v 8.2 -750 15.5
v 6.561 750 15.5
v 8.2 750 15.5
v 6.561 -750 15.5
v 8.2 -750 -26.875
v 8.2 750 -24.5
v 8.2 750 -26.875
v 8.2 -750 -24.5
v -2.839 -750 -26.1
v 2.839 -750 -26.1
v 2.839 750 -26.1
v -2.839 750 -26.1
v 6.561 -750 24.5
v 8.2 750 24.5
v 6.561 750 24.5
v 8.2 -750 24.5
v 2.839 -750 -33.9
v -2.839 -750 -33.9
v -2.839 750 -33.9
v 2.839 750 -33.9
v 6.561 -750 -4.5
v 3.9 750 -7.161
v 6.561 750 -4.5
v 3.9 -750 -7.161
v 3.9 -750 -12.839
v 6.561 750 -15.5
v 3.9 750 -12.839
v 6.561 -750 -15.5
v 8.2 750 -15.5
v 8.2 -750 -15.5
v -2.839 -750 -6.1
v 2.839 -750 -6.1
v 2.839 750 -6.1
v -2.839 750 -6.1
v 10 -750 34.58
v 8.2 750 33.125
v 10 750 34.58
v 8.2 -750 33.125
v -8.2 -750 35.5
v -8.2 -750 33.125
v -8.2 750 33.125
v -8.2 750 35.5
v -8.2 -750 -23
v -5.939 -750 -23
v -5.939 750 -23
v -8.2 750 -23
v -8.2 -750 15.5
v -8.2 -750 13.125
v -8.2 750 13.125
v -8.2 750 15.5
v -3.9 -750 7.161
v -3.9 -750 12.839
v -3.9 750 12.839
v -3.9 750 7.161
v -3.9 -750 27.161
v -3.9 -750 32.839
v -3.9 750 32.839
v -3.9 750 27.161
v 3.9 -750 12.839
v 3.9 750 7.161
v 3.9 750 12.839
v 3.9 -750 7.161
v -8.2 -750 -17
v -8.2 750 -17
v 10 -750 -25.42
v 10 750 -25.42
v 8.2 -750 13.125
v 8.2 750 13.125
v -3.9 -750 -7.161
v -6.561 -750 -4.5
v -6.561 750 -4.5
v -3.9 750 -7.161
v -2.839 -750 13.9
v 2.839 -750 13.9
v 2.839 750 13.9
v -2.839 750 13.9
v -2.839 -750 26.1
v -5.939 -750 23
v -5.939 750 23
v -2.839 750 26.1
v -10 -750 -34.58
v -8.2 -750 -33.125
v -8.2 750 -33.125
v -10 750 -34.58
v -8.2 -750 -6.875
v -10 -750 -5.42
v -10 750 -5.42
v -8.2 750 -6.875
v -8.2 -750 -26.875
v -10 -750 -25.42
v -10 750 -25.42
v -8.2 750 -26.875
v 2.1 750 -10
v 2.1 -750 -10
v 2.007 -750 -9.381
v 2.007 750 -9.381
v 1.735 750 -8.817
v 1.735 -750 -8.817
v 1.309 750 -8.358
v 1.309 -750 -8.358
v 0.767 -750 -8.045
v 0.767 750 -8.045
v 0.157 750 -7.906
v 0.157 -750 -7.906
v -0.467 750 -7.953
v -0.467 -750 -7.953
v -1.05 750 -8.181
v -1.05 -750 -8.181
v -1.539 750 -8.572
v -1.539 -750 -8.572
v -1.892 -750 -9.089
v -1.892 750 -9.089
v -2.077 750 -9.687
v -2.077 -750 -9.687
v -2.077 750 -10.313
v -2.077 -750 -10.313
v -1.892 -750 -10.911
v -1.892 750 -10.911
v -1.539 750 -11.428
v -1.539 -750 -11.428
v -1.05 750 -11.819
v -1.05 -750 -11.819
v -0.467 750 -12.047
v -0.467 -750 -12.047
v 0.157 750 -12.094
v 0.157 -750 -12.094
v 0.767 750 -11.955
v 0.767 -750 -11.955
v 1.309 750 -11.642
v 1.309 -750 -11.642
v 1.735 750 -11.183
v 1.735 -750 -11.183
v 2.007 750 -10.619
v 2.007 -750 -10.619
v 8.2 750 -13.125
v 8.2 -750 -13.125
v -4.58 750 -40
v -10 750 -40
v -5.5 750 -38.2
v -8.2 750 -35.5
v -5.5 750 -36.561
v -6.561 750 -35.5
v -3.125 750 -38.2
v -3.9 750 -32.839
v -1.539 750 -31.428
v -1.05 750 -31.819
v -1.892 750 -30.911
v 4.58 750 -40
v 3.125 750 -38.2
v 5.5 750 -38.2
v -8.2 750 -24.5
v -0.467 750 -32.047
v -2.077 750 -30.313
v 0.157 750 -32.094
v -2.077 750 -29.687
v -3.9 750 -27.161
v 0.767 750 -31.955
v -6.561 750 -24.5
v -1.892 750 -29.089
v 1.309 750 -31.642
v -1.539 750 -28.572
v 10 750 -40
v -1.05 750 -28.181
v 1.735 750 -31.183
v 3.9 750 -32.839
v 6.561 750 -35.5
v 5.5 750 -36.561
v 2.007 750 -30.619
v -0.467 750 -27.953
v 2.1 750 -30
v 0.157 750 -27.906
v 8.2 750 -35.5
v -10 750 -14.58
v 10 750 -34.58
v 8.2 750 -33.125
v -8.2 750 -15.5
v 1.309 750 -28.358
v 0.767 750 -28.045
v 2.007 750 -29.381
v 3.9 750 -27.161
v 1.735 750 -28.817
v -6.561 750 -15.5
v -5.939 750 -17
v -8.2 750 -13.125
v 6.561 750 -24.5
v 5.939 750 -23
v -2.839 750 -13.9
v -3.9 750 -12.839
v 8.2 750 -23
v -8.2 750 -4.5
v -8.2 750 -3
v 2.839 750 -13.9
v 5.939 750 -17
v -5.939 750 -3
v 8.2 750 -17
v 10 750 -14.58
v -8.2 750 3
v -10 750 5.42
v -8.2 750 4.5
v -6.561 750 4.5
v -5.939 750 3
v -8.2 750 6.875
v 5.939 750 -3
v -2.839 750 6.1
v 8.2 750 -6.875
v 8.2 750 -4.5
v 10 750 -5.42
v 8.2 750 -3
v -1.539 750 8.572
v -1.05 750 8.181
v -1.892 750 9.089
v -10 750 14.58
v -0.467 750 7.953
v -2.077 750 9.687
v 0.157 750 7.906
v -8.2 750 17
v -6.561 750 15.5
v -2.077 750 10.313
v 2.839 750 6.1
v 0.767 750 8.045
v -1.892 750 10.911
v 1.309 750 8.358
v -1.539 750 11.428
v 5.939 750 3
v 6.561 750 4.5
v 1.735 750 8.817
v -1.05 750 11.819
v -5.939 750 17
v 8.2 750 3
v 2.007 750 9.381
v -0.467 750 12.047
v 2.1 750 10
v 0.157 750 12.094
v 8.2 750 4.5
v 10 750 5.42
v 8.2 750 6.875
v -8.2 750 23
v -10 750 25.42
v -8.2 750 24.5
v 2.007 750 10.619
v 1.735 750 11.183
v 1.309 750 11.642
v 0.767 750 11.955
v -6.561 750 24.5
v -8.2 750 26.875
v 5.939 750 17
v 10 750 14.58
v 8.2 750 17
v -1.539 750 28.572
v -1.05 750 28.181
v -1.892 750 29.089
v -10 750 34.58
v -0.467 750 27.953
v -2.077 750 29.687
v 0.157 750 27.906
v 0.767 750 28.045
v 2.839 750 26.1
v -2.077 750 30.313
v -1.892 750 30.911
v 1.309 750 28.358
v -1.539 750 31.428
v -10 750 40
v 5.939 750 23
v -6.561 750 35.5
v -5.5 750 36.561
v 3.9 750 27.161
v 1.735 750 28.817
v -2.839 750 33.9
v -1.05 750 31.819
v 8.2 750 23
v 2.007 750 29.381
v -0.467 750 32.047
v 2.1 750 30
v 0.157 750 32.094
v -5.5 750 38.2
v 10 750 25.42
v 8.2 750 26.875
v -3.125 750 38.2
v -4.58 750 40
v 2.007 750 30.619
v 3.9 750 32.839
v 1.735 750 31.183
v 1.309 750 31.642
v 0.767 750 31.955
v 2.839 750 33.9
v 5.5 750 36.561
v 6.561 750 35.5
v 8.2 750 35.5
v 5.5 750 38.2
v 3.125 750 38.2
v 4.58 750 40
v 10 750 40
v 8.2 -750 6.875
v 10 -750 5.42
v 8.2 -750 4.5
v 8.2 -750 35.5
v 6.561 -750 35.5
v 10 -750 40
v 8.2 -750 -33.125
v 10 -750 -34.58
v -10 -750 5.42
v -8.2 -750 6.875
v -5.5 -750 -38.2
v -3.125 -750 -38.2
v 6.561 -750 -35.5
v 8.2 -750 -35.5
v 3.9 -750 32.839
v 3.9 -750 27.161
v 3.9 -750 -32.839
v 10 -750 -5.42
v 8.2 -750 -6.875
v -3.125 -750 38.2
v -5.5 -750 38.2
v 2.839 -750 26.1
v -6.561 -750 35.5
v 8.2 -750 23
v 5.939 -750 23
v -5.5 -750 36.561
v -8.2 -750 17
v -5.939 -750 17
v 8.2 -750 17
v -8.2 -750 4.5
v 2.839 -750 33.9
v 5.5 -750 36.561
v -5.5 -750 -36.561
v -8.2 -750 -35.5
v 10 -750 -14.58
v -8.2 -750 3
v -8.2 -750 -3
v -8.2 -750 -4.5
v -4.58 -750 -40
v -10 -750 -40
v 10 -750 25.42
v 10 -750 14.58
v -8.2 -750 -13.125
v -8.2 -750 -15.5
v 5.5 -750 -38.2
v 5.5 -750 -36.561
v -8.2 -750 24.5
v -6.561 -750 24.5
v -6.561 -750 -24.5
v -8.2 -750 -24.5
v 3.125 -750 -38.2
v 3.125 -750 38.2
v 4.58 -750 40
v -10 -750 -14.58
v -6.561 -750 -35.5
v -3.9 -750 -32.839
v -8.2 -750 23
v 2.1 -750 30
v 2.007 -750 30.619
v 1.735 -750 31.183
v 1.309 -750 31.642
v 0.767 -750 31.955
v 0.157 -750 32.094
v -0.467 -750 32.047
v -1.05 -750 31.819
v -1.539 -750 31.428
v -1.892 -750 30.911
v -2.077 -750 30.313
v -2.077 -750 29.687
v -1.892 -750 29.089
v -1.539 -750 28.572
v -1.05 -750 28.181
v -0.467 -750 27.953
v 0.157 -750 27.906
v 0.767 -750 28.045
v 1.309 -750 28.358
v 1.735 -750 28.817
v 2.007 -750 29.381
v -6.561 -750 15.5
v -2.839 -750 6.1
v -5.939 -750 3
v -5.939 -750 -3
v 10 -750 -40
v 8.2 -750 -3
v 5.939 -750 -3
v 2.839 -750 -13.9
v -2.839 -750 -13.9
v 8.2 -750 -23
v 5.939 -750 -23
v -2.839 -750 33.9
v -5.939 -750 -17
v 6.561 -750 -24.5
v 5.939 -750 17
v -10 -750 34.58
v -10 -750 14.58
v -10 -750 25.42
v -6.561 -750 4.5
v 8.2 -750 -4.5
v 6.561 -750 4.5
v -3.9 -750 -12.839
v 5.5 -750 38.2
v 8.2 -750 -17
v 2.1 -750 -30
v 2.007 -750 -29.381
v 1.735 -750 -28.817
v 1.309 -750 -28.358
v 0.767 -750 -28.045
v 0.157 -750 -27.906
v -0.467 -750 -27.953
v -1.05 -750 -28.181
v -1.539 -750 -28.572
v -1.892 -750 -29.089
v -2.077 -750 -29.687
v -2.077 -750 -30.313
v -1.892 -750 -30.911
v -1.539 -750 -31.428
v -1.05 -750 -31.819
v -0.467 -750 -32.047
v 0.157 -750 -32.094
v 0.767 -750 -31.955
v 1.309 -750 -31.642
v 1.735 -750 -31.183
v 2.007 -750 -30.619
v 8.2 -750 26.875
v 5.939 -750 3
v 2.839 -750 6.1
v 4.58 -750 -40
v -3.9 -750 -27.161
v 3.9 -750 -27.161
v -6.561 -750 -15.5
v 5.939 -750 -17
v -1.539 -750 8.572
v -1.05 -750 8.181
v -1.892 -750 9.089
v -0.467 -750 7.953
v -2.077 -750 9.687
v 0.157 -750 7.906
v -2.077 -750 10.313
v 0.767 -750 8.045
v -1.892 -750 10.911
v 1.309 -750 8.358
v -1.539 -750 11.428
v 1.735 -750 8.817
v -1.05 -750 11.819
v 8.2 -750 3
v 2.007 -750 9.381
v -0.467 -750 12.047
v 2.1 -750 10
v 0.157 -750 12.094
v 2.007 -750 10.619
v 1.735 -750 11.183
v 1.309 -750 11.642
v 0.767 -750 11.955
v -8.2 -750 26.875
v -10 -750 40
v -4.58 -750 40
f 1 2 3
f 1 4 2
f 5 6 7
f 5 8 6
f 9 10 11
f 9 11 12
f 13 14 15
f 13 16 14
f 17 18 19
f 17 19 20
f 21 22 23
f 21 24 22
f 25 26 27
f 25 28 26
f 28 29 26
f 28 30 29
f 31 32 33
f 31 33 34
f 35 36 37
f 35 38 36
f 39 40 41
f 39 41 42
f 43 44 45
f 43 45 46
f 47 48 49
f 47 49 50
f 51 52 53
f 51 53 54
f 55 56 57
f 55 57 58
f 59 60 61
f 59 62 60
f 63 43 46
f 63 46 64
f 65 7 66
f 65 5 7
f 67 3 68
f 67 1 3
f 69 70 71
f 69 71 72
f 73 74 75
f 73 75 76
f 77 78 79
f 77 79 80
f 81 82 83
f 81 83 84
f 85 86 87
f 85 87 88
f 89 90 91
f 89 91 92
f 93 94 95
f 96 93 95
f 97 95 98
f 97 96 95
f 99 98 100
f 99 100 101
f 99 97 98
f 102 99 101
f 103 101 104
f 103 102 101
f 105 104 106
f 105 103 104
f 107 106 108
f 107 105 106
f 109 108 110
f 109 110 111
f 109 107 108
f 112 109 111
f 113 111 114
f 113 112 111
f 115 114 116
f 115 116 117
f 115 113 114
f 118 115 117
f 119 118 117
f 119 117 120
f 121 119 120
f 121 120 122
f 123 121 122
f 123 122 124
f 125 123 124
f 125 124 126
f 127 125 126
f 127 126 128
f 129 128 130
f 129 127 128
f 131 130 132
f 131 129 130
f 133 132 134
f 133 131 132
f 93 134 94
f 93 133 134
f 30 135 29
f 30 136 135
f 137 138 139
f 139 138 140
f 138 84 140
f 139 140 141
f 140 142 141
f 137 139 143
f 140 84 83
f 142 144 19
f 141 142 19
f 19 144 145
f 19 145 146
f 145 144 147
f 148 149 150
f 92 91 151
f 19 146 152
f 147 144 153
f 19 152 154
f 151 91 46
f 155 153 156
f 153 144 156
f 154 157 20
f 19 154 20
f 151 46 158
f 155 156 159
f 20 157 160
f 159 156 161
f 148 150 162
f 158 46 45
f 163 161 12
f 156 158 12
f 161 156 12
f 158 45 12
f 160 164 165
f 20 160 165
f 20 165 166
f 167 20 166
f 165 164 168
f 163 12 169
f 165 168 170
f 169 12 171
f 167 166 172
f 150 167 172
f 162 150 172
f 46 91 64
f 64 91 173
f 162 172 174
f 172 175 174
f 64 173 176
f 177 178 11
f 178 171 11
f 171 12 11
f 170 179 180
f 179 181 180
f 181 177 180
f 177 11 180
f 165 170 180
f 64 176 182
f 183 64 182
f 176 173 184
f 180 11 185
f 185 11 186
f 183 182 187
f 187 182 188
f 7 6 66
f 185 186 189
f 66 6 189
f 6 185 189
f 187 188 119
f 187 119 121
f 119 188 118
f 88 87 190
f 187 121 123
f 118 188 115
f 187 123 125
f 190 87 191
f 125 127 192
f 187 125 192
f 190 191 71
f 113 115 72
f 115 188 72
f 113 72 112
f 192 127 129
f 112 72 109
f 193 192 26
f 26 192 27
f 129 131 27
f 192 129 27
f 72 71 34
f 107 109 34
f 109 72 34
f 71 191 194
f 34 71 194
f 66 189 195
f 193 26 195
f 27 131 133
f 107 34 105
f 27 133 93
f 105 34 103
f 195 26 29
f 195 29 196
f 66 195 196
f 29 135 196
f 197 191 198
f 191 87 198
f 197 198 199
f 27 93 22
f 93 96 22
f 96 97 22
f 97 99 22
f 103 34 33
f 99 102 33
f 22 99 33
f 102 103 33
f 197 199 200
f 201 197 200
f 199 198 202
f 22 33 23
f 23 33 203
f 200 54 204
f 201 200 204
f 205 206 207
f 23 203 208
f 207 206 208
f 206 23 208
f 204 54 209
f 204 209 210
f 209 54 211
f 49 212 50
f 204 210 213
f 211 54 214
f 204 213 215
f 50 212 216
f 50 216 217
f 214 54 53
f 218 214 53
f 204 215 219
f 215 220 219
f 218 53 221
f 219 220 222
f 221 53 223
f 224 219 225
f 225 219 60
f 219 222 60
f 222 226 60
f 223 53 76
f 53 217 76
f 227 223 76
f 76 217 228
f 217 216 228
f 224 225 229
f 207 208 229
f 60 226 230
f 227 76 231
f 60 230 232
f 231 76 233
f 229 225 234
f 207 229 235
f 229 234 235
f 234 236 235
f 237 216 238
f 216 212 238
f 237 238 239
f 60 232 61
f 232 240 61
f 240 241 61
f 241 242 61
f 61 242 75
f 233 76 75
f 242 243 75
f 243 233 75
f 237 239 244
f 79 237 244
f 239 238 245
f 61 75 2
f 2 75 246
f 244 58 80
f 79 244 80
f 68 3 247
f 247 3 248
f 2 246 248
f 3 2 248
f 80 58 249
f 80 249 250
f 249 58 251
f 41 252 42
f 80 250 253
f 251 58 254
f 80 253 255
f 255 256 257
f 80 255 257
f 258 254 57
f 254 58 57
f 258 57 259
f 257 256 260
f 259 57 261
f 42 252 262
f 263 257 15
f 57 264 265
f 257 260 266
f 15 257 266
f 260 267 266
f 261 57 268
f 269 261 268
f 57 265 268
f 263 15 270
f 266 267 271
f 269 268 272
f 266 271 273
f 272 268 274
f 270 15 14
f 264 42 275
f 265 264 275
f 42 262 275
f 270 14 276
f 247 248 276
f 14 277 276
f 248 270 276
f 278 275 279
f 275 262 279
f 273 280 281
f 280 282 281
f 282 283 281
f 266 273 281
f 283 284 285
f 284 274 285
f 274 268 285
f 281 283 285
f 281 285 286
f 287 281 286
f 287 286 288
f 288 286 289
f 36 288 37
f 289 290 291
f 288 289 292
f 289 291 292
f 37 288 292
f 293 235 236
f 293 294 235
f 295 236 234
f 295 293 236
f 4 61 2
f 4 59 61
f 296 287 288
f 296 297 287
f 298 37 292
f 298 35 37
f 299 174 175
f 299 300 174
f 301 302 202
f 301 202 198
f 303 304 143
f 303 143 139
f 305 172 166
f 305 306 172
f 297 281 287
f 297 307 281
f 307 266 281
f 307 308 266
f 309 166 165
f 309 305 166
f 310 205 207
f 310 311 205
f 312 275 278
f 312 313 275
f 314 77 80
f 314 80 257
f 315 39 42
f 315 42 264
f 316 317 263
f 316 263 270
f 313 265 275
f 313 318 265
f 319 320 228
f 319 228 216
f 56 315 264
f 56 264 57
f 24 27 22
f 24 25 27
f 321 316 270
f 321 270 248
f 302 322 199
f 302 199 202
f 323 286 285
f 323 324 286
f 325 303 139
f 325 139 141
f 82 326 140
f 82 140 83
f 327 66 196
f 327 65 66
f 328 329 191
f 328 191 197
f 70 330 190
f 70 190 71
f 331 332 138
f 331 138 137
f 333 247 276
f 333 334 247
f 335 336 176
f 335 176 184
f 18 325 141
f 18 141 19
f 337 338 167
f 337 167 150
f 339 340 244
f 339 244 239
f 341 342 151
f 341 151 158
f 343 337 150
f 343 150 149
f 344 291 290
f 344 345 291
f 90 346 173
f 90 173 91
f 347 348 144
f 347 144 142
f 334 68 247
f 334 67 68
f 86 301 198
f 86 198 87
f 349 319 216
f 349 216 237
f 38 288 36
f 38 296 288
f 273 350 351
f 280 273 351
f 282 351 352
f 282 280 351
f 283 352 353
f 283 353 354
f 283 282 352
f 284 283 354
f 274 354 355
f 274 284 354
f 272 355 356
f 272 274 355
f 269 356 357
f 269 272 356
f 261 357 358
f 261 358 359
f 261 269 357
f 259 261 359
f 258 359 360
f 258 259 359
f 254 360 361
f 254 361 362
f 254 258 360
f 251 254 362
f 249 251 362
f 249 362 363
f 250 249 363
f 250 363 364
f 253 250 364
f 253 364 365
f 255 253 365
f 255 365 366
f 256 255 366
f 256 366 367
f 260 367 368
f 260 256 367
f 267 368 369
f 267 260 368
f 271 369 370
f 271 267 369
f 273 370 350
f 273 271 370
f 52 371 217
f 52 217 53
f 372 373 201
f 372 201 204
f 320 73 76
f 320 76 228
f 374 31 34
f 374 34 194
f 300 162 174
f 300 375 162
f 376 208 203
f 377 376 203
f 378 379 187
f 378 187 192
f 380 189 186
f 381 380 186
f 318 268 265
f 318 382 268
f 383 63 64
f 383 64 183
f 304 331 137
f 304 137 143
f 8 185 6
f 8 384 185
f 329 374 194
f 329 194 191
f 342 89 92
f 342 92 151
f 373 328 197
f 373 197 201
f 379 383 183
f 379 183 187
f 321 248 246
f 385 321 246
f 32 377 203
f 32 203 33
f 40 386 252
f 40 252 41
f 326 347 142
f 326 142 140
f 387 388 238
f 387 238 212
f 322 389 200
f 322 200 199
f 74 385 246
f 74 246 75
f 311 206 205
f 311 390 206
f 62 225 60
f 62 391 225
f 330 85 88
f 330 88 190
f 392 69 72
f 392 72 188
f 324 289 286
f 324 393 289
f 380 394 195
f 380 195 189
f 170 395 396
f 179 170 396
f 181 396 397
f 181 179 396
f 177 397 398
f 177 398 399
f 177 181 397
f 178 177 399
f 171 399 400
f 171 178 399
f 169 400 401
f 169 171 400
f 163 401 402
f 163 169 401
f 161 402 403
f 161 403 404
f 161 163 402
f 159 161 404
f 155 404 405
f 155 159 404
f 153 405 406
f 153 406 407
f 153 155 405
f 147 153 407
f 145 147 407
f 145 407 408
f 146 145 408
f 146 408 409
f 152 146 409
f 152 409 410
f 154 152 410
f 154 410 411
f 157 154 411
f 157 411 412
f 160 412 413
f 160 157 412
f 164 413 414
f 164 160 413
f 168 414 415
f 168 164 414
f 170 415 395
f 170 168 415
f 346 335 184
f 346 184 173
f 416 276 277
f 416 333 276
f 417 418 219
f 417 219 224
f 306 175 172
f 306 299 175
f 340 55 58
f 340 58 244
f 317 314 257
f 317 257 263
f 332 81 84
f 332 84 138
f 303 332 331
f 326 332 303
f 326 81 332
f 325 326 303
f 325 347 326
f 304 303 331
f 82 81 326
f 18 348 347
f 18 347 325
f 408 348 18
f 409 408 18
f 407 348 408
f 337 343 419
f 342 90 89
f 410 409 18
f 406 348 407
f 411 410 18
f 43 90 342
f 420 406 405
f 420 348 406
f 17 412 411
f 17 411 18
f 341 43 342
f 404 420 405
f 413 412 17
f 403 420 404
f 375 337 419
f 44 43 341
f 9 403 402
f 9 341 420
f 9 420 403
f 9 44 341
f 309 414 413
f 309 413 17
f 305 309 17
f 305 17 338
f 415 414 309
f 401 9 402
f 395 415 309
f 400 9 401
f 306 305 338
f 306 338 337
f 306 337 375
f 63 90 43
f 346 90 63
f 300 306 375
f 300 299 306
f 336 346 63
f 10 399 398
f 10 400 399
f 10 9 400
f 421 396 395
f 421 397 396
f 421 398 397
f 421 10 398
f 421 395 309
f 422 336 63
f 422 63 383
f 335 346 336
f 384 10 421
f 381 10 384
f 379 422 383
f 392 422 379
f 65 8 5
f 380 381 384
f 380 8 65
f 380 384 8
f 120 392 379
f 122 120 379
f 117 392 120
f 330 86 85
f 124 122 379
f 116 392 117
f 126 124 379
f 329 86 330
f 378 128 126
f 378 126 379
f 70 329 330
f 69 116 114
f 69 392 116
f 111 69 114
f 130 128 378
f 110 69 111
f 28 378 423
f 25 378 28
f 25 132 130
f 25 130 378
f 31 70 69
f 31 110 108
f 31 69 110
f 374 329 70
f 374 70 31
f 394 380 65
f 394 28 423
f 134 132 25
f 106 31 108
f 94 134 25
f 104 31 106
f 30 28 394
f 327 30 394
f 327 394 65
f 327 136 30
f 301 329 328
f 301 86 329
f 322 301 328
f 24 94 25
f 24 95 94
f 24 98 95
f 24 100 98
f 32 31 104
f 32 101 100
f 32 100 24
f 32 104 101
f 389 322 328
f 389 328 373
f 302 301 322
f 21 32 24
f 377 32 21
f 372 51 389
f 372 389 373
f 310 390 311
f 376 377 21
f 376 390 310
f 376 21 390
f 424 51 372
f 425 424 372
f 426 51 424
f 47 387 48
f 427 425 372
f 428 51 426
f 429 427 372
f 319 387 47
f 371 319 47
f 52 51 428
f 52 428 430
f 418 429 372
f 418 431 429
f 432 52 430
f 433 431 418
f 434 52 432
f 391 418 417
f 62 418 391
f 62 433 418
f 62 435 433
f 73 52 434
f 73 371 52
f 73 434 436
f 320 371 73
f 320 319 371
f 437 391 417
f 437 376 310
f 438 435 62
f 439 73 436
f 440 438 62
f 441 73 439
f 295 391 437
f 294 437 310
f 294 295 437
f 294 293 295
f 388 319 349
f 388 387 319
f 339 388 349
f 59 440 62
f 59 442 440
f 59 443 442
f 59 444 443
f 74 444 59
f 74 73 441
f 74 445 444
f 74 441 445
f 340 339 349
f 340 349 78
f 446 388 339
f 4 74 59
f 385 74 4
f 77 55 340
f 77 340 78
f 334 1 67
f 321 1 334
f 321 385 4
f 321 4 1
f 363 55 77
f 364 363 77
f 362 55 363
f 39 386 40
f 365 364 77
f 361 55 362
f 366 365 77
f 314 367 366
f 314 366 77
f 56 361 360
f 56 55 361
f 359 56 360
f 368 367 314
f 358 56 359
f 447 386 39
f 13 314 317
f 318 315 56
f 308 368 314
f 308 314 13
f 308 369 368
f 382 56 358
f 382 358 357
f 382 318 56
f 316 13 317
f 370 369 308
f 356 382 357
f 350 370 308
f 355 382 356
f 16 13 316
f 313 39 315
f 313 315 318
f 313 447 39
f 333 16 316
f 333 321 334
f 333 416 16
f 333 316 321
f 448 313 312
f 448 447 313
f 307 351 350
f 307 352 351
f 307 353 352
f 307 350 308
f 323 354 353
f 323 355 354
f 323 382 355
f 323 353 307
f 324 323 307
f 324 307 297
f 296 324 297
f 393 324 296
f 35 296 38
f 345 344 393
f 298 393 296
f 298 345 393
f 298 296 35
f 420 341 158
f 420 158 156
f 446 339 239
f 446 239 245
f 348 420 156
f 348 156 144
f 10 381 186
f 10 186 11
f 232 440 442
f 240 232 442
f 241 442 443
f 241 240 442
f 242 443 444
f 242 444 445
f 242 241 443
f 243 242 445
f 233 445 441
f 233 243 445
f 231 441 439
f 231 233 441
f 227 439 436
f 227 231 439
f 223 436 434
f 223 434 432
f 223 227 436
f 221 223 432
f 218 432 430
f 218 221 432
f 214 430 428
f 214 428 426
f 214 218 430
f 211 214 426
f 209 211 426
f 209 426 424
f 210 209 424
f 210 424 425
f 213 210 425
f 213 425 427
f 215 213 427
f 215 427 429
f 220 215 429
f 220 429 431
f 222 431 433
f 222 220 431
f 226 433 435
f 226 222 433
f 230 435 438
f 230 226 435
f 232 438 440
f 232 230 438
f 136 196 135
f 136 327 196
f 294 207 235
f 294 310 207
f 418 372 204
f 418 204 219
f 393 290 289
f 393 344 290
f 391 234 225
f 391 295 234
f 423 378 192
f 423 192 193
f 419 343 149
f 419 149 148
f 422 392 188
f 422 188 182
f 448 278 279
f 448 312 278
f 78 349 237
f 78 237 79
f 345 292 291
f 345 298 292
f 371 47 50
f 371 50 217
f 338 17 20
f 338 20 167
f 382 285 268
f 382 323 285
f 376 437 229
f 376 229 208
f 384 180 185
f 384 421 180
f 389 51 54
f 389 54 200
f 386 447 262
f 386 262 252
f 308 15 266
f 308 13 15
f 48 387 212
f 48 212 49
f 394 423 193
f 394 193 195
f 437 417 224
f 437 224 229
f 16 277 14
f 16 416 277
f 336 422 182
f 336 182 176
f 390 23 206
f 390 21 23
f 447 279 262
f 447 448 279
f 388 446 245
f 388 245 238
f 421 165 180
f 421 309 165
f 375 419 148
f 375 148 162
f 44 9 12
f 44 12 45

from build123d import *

# Parameters (mm, degrees)
F0_R     = 2.1
F1_DEPTH = 750


with BuildPart() as f1:
    # F0 (on Front) → F1 (new body, symmetric)
    with BuildSketch(Plane.XZ):
        Polygon((-4.58, 40), (-10, 40), (-10, 34.58), (-8.2, 33.125), (-8.2, 35.5), (-6.56066, 35.5), (-3.9, 32.83934), (-3.9, 27.16066), (-6.56066, 24.5), (-8.2, 24.5), (-8.2, 26.875), (-10, 25.42), (-10, 14.58), (-8.2, 13.125), (-8.2, 15.5), (-6.56066, 15.5), (-3.9, 12.83934), (-3.9, 7.16066), (-6.56066, 4.5), (-8.2, 4.5), (-8.2, 6.875), (-10, 5.42), (-10, -5.42), (-8.2, -6.875), (-8.2, -4.5), (-6.56066, -4.5), (-3.9, -7.16066), (-3.9, -12.83934), (-6.56066, -15.5), (-8.2, -15.5), (-8.2, -13.125), (-10, -14.58), (-10, -25.42), (-8.2, -26.875), (-8.2, -24.5), (-6.56066, -24.5), (-3.9, -27.16066), (-3.9, -32.83934), (-6.56066, -35.5), (-8.2, -35.5), (-8.2, -33.125), (-10, -34.58), (-10, -40), (-4.58, -40), (-3.125, -38.2), (-5.5, -38.2), (-5.5, -36.56066), (-2.83934, -33.9), (2.83934, -33.9), (5.5, -36.56066), (5.5, -38.2), (3.125, -38.2), (4.58, -40), (10, -40), (10, -34.58), (8.2, -33.125), (8.2, -35.5), (6.56066, -35.5), (3.9, -32.83934), (3.9, -27.16066), (6.56066, -24.5), (8.2, -24.5), (8.2, -26.875), (10, -25.42), (10, -14.58), (8.2, -13.125), (8.2, -15.5), (6.56066, -15.5), (3.9, -12.83934), (3.9, -7.16066), (6.56066, -4.5), (8.2, -4.5), (8.2, -6.875), (10, -5.42), (10, 5.42), (8.2, 6.875), (8.2, 4.5), (6.56066, 4.5), (3.9, 7.16066), (3.9, 12.83934), (6.56066, 15.5), (8.2, 15.5), (8.2, 13.125), (10, 14.58), (10, 25.42), (8.2, 26.875), (8.2, 24.5), (6.56066, 24.5), (3.9, 27.16066), (3.9, 32.83934), (6.56066, 35.5), (8.2, 35.5), (8.2, 33.125), (10, 34.58), (10, 40), (4.58, 40), (3.125, 38.2), (5.5, 38.2), (5.5, 36.56066), (2.83934, 33.9), (-2.83934, 33.9), (-5.5, 36.56066), (-5.5, 38.2), (-3.125, 38.2), align=None)
        with Locations((0, -30)):
            Circle(F0_R, mode=Mode.SUBTRACT)
        Polygon((-5.93934, -17), (-2.83934, -13.9), (2.83934, -13.9), (5.93934, -17), (8.2, -17), (8.2, -23), (5.93934, -23), (2.83934, -26.1), (-2.83934, -26.1), (-5.93934, -23), (-8.2, -23), (-8.2, -17), align=None, mode=Mode.SUBTRACT)
        with Locations((0, -10)):
            Circle(F0_R, mode=Mode.SUBTRACT)
        Polygon((-5.93934, 3), (-2.83934, 6.1), (2.83934, 6.1), (5.93934, 3), (8.2, 3), (8.2, -3), (5.93934, -3), (2.83934, -6.1), (-2.83934, -6.1), (-5.93934, -3), (-8.2, -3), (-8.2, 3), align=None, mode=Mode.SUBTRACT)
        with Locations((0, 10)):
            Circle(F0_R, mode=Mode.SUBTRACT)
        Polygon((-5.93934, 23), (-2.83934, 26.1), (2.83934, 26.1), (5.93934, 23), (8.2, 23), (8.2, 17), (5.93934, 17), (2.83934, 13.9), (-2.83934, 13.9), (-5.93934, 17), (-8.2, 17), (-8.2, 23), align=None, mode=Mode.SUBTRACT)
        with Locations((0, 30)):
            Circle(F0_R, mode=Mode.SUBTRACT)
    extrude(amount=F1_DEPTH, both=True)


solid = f1.part
